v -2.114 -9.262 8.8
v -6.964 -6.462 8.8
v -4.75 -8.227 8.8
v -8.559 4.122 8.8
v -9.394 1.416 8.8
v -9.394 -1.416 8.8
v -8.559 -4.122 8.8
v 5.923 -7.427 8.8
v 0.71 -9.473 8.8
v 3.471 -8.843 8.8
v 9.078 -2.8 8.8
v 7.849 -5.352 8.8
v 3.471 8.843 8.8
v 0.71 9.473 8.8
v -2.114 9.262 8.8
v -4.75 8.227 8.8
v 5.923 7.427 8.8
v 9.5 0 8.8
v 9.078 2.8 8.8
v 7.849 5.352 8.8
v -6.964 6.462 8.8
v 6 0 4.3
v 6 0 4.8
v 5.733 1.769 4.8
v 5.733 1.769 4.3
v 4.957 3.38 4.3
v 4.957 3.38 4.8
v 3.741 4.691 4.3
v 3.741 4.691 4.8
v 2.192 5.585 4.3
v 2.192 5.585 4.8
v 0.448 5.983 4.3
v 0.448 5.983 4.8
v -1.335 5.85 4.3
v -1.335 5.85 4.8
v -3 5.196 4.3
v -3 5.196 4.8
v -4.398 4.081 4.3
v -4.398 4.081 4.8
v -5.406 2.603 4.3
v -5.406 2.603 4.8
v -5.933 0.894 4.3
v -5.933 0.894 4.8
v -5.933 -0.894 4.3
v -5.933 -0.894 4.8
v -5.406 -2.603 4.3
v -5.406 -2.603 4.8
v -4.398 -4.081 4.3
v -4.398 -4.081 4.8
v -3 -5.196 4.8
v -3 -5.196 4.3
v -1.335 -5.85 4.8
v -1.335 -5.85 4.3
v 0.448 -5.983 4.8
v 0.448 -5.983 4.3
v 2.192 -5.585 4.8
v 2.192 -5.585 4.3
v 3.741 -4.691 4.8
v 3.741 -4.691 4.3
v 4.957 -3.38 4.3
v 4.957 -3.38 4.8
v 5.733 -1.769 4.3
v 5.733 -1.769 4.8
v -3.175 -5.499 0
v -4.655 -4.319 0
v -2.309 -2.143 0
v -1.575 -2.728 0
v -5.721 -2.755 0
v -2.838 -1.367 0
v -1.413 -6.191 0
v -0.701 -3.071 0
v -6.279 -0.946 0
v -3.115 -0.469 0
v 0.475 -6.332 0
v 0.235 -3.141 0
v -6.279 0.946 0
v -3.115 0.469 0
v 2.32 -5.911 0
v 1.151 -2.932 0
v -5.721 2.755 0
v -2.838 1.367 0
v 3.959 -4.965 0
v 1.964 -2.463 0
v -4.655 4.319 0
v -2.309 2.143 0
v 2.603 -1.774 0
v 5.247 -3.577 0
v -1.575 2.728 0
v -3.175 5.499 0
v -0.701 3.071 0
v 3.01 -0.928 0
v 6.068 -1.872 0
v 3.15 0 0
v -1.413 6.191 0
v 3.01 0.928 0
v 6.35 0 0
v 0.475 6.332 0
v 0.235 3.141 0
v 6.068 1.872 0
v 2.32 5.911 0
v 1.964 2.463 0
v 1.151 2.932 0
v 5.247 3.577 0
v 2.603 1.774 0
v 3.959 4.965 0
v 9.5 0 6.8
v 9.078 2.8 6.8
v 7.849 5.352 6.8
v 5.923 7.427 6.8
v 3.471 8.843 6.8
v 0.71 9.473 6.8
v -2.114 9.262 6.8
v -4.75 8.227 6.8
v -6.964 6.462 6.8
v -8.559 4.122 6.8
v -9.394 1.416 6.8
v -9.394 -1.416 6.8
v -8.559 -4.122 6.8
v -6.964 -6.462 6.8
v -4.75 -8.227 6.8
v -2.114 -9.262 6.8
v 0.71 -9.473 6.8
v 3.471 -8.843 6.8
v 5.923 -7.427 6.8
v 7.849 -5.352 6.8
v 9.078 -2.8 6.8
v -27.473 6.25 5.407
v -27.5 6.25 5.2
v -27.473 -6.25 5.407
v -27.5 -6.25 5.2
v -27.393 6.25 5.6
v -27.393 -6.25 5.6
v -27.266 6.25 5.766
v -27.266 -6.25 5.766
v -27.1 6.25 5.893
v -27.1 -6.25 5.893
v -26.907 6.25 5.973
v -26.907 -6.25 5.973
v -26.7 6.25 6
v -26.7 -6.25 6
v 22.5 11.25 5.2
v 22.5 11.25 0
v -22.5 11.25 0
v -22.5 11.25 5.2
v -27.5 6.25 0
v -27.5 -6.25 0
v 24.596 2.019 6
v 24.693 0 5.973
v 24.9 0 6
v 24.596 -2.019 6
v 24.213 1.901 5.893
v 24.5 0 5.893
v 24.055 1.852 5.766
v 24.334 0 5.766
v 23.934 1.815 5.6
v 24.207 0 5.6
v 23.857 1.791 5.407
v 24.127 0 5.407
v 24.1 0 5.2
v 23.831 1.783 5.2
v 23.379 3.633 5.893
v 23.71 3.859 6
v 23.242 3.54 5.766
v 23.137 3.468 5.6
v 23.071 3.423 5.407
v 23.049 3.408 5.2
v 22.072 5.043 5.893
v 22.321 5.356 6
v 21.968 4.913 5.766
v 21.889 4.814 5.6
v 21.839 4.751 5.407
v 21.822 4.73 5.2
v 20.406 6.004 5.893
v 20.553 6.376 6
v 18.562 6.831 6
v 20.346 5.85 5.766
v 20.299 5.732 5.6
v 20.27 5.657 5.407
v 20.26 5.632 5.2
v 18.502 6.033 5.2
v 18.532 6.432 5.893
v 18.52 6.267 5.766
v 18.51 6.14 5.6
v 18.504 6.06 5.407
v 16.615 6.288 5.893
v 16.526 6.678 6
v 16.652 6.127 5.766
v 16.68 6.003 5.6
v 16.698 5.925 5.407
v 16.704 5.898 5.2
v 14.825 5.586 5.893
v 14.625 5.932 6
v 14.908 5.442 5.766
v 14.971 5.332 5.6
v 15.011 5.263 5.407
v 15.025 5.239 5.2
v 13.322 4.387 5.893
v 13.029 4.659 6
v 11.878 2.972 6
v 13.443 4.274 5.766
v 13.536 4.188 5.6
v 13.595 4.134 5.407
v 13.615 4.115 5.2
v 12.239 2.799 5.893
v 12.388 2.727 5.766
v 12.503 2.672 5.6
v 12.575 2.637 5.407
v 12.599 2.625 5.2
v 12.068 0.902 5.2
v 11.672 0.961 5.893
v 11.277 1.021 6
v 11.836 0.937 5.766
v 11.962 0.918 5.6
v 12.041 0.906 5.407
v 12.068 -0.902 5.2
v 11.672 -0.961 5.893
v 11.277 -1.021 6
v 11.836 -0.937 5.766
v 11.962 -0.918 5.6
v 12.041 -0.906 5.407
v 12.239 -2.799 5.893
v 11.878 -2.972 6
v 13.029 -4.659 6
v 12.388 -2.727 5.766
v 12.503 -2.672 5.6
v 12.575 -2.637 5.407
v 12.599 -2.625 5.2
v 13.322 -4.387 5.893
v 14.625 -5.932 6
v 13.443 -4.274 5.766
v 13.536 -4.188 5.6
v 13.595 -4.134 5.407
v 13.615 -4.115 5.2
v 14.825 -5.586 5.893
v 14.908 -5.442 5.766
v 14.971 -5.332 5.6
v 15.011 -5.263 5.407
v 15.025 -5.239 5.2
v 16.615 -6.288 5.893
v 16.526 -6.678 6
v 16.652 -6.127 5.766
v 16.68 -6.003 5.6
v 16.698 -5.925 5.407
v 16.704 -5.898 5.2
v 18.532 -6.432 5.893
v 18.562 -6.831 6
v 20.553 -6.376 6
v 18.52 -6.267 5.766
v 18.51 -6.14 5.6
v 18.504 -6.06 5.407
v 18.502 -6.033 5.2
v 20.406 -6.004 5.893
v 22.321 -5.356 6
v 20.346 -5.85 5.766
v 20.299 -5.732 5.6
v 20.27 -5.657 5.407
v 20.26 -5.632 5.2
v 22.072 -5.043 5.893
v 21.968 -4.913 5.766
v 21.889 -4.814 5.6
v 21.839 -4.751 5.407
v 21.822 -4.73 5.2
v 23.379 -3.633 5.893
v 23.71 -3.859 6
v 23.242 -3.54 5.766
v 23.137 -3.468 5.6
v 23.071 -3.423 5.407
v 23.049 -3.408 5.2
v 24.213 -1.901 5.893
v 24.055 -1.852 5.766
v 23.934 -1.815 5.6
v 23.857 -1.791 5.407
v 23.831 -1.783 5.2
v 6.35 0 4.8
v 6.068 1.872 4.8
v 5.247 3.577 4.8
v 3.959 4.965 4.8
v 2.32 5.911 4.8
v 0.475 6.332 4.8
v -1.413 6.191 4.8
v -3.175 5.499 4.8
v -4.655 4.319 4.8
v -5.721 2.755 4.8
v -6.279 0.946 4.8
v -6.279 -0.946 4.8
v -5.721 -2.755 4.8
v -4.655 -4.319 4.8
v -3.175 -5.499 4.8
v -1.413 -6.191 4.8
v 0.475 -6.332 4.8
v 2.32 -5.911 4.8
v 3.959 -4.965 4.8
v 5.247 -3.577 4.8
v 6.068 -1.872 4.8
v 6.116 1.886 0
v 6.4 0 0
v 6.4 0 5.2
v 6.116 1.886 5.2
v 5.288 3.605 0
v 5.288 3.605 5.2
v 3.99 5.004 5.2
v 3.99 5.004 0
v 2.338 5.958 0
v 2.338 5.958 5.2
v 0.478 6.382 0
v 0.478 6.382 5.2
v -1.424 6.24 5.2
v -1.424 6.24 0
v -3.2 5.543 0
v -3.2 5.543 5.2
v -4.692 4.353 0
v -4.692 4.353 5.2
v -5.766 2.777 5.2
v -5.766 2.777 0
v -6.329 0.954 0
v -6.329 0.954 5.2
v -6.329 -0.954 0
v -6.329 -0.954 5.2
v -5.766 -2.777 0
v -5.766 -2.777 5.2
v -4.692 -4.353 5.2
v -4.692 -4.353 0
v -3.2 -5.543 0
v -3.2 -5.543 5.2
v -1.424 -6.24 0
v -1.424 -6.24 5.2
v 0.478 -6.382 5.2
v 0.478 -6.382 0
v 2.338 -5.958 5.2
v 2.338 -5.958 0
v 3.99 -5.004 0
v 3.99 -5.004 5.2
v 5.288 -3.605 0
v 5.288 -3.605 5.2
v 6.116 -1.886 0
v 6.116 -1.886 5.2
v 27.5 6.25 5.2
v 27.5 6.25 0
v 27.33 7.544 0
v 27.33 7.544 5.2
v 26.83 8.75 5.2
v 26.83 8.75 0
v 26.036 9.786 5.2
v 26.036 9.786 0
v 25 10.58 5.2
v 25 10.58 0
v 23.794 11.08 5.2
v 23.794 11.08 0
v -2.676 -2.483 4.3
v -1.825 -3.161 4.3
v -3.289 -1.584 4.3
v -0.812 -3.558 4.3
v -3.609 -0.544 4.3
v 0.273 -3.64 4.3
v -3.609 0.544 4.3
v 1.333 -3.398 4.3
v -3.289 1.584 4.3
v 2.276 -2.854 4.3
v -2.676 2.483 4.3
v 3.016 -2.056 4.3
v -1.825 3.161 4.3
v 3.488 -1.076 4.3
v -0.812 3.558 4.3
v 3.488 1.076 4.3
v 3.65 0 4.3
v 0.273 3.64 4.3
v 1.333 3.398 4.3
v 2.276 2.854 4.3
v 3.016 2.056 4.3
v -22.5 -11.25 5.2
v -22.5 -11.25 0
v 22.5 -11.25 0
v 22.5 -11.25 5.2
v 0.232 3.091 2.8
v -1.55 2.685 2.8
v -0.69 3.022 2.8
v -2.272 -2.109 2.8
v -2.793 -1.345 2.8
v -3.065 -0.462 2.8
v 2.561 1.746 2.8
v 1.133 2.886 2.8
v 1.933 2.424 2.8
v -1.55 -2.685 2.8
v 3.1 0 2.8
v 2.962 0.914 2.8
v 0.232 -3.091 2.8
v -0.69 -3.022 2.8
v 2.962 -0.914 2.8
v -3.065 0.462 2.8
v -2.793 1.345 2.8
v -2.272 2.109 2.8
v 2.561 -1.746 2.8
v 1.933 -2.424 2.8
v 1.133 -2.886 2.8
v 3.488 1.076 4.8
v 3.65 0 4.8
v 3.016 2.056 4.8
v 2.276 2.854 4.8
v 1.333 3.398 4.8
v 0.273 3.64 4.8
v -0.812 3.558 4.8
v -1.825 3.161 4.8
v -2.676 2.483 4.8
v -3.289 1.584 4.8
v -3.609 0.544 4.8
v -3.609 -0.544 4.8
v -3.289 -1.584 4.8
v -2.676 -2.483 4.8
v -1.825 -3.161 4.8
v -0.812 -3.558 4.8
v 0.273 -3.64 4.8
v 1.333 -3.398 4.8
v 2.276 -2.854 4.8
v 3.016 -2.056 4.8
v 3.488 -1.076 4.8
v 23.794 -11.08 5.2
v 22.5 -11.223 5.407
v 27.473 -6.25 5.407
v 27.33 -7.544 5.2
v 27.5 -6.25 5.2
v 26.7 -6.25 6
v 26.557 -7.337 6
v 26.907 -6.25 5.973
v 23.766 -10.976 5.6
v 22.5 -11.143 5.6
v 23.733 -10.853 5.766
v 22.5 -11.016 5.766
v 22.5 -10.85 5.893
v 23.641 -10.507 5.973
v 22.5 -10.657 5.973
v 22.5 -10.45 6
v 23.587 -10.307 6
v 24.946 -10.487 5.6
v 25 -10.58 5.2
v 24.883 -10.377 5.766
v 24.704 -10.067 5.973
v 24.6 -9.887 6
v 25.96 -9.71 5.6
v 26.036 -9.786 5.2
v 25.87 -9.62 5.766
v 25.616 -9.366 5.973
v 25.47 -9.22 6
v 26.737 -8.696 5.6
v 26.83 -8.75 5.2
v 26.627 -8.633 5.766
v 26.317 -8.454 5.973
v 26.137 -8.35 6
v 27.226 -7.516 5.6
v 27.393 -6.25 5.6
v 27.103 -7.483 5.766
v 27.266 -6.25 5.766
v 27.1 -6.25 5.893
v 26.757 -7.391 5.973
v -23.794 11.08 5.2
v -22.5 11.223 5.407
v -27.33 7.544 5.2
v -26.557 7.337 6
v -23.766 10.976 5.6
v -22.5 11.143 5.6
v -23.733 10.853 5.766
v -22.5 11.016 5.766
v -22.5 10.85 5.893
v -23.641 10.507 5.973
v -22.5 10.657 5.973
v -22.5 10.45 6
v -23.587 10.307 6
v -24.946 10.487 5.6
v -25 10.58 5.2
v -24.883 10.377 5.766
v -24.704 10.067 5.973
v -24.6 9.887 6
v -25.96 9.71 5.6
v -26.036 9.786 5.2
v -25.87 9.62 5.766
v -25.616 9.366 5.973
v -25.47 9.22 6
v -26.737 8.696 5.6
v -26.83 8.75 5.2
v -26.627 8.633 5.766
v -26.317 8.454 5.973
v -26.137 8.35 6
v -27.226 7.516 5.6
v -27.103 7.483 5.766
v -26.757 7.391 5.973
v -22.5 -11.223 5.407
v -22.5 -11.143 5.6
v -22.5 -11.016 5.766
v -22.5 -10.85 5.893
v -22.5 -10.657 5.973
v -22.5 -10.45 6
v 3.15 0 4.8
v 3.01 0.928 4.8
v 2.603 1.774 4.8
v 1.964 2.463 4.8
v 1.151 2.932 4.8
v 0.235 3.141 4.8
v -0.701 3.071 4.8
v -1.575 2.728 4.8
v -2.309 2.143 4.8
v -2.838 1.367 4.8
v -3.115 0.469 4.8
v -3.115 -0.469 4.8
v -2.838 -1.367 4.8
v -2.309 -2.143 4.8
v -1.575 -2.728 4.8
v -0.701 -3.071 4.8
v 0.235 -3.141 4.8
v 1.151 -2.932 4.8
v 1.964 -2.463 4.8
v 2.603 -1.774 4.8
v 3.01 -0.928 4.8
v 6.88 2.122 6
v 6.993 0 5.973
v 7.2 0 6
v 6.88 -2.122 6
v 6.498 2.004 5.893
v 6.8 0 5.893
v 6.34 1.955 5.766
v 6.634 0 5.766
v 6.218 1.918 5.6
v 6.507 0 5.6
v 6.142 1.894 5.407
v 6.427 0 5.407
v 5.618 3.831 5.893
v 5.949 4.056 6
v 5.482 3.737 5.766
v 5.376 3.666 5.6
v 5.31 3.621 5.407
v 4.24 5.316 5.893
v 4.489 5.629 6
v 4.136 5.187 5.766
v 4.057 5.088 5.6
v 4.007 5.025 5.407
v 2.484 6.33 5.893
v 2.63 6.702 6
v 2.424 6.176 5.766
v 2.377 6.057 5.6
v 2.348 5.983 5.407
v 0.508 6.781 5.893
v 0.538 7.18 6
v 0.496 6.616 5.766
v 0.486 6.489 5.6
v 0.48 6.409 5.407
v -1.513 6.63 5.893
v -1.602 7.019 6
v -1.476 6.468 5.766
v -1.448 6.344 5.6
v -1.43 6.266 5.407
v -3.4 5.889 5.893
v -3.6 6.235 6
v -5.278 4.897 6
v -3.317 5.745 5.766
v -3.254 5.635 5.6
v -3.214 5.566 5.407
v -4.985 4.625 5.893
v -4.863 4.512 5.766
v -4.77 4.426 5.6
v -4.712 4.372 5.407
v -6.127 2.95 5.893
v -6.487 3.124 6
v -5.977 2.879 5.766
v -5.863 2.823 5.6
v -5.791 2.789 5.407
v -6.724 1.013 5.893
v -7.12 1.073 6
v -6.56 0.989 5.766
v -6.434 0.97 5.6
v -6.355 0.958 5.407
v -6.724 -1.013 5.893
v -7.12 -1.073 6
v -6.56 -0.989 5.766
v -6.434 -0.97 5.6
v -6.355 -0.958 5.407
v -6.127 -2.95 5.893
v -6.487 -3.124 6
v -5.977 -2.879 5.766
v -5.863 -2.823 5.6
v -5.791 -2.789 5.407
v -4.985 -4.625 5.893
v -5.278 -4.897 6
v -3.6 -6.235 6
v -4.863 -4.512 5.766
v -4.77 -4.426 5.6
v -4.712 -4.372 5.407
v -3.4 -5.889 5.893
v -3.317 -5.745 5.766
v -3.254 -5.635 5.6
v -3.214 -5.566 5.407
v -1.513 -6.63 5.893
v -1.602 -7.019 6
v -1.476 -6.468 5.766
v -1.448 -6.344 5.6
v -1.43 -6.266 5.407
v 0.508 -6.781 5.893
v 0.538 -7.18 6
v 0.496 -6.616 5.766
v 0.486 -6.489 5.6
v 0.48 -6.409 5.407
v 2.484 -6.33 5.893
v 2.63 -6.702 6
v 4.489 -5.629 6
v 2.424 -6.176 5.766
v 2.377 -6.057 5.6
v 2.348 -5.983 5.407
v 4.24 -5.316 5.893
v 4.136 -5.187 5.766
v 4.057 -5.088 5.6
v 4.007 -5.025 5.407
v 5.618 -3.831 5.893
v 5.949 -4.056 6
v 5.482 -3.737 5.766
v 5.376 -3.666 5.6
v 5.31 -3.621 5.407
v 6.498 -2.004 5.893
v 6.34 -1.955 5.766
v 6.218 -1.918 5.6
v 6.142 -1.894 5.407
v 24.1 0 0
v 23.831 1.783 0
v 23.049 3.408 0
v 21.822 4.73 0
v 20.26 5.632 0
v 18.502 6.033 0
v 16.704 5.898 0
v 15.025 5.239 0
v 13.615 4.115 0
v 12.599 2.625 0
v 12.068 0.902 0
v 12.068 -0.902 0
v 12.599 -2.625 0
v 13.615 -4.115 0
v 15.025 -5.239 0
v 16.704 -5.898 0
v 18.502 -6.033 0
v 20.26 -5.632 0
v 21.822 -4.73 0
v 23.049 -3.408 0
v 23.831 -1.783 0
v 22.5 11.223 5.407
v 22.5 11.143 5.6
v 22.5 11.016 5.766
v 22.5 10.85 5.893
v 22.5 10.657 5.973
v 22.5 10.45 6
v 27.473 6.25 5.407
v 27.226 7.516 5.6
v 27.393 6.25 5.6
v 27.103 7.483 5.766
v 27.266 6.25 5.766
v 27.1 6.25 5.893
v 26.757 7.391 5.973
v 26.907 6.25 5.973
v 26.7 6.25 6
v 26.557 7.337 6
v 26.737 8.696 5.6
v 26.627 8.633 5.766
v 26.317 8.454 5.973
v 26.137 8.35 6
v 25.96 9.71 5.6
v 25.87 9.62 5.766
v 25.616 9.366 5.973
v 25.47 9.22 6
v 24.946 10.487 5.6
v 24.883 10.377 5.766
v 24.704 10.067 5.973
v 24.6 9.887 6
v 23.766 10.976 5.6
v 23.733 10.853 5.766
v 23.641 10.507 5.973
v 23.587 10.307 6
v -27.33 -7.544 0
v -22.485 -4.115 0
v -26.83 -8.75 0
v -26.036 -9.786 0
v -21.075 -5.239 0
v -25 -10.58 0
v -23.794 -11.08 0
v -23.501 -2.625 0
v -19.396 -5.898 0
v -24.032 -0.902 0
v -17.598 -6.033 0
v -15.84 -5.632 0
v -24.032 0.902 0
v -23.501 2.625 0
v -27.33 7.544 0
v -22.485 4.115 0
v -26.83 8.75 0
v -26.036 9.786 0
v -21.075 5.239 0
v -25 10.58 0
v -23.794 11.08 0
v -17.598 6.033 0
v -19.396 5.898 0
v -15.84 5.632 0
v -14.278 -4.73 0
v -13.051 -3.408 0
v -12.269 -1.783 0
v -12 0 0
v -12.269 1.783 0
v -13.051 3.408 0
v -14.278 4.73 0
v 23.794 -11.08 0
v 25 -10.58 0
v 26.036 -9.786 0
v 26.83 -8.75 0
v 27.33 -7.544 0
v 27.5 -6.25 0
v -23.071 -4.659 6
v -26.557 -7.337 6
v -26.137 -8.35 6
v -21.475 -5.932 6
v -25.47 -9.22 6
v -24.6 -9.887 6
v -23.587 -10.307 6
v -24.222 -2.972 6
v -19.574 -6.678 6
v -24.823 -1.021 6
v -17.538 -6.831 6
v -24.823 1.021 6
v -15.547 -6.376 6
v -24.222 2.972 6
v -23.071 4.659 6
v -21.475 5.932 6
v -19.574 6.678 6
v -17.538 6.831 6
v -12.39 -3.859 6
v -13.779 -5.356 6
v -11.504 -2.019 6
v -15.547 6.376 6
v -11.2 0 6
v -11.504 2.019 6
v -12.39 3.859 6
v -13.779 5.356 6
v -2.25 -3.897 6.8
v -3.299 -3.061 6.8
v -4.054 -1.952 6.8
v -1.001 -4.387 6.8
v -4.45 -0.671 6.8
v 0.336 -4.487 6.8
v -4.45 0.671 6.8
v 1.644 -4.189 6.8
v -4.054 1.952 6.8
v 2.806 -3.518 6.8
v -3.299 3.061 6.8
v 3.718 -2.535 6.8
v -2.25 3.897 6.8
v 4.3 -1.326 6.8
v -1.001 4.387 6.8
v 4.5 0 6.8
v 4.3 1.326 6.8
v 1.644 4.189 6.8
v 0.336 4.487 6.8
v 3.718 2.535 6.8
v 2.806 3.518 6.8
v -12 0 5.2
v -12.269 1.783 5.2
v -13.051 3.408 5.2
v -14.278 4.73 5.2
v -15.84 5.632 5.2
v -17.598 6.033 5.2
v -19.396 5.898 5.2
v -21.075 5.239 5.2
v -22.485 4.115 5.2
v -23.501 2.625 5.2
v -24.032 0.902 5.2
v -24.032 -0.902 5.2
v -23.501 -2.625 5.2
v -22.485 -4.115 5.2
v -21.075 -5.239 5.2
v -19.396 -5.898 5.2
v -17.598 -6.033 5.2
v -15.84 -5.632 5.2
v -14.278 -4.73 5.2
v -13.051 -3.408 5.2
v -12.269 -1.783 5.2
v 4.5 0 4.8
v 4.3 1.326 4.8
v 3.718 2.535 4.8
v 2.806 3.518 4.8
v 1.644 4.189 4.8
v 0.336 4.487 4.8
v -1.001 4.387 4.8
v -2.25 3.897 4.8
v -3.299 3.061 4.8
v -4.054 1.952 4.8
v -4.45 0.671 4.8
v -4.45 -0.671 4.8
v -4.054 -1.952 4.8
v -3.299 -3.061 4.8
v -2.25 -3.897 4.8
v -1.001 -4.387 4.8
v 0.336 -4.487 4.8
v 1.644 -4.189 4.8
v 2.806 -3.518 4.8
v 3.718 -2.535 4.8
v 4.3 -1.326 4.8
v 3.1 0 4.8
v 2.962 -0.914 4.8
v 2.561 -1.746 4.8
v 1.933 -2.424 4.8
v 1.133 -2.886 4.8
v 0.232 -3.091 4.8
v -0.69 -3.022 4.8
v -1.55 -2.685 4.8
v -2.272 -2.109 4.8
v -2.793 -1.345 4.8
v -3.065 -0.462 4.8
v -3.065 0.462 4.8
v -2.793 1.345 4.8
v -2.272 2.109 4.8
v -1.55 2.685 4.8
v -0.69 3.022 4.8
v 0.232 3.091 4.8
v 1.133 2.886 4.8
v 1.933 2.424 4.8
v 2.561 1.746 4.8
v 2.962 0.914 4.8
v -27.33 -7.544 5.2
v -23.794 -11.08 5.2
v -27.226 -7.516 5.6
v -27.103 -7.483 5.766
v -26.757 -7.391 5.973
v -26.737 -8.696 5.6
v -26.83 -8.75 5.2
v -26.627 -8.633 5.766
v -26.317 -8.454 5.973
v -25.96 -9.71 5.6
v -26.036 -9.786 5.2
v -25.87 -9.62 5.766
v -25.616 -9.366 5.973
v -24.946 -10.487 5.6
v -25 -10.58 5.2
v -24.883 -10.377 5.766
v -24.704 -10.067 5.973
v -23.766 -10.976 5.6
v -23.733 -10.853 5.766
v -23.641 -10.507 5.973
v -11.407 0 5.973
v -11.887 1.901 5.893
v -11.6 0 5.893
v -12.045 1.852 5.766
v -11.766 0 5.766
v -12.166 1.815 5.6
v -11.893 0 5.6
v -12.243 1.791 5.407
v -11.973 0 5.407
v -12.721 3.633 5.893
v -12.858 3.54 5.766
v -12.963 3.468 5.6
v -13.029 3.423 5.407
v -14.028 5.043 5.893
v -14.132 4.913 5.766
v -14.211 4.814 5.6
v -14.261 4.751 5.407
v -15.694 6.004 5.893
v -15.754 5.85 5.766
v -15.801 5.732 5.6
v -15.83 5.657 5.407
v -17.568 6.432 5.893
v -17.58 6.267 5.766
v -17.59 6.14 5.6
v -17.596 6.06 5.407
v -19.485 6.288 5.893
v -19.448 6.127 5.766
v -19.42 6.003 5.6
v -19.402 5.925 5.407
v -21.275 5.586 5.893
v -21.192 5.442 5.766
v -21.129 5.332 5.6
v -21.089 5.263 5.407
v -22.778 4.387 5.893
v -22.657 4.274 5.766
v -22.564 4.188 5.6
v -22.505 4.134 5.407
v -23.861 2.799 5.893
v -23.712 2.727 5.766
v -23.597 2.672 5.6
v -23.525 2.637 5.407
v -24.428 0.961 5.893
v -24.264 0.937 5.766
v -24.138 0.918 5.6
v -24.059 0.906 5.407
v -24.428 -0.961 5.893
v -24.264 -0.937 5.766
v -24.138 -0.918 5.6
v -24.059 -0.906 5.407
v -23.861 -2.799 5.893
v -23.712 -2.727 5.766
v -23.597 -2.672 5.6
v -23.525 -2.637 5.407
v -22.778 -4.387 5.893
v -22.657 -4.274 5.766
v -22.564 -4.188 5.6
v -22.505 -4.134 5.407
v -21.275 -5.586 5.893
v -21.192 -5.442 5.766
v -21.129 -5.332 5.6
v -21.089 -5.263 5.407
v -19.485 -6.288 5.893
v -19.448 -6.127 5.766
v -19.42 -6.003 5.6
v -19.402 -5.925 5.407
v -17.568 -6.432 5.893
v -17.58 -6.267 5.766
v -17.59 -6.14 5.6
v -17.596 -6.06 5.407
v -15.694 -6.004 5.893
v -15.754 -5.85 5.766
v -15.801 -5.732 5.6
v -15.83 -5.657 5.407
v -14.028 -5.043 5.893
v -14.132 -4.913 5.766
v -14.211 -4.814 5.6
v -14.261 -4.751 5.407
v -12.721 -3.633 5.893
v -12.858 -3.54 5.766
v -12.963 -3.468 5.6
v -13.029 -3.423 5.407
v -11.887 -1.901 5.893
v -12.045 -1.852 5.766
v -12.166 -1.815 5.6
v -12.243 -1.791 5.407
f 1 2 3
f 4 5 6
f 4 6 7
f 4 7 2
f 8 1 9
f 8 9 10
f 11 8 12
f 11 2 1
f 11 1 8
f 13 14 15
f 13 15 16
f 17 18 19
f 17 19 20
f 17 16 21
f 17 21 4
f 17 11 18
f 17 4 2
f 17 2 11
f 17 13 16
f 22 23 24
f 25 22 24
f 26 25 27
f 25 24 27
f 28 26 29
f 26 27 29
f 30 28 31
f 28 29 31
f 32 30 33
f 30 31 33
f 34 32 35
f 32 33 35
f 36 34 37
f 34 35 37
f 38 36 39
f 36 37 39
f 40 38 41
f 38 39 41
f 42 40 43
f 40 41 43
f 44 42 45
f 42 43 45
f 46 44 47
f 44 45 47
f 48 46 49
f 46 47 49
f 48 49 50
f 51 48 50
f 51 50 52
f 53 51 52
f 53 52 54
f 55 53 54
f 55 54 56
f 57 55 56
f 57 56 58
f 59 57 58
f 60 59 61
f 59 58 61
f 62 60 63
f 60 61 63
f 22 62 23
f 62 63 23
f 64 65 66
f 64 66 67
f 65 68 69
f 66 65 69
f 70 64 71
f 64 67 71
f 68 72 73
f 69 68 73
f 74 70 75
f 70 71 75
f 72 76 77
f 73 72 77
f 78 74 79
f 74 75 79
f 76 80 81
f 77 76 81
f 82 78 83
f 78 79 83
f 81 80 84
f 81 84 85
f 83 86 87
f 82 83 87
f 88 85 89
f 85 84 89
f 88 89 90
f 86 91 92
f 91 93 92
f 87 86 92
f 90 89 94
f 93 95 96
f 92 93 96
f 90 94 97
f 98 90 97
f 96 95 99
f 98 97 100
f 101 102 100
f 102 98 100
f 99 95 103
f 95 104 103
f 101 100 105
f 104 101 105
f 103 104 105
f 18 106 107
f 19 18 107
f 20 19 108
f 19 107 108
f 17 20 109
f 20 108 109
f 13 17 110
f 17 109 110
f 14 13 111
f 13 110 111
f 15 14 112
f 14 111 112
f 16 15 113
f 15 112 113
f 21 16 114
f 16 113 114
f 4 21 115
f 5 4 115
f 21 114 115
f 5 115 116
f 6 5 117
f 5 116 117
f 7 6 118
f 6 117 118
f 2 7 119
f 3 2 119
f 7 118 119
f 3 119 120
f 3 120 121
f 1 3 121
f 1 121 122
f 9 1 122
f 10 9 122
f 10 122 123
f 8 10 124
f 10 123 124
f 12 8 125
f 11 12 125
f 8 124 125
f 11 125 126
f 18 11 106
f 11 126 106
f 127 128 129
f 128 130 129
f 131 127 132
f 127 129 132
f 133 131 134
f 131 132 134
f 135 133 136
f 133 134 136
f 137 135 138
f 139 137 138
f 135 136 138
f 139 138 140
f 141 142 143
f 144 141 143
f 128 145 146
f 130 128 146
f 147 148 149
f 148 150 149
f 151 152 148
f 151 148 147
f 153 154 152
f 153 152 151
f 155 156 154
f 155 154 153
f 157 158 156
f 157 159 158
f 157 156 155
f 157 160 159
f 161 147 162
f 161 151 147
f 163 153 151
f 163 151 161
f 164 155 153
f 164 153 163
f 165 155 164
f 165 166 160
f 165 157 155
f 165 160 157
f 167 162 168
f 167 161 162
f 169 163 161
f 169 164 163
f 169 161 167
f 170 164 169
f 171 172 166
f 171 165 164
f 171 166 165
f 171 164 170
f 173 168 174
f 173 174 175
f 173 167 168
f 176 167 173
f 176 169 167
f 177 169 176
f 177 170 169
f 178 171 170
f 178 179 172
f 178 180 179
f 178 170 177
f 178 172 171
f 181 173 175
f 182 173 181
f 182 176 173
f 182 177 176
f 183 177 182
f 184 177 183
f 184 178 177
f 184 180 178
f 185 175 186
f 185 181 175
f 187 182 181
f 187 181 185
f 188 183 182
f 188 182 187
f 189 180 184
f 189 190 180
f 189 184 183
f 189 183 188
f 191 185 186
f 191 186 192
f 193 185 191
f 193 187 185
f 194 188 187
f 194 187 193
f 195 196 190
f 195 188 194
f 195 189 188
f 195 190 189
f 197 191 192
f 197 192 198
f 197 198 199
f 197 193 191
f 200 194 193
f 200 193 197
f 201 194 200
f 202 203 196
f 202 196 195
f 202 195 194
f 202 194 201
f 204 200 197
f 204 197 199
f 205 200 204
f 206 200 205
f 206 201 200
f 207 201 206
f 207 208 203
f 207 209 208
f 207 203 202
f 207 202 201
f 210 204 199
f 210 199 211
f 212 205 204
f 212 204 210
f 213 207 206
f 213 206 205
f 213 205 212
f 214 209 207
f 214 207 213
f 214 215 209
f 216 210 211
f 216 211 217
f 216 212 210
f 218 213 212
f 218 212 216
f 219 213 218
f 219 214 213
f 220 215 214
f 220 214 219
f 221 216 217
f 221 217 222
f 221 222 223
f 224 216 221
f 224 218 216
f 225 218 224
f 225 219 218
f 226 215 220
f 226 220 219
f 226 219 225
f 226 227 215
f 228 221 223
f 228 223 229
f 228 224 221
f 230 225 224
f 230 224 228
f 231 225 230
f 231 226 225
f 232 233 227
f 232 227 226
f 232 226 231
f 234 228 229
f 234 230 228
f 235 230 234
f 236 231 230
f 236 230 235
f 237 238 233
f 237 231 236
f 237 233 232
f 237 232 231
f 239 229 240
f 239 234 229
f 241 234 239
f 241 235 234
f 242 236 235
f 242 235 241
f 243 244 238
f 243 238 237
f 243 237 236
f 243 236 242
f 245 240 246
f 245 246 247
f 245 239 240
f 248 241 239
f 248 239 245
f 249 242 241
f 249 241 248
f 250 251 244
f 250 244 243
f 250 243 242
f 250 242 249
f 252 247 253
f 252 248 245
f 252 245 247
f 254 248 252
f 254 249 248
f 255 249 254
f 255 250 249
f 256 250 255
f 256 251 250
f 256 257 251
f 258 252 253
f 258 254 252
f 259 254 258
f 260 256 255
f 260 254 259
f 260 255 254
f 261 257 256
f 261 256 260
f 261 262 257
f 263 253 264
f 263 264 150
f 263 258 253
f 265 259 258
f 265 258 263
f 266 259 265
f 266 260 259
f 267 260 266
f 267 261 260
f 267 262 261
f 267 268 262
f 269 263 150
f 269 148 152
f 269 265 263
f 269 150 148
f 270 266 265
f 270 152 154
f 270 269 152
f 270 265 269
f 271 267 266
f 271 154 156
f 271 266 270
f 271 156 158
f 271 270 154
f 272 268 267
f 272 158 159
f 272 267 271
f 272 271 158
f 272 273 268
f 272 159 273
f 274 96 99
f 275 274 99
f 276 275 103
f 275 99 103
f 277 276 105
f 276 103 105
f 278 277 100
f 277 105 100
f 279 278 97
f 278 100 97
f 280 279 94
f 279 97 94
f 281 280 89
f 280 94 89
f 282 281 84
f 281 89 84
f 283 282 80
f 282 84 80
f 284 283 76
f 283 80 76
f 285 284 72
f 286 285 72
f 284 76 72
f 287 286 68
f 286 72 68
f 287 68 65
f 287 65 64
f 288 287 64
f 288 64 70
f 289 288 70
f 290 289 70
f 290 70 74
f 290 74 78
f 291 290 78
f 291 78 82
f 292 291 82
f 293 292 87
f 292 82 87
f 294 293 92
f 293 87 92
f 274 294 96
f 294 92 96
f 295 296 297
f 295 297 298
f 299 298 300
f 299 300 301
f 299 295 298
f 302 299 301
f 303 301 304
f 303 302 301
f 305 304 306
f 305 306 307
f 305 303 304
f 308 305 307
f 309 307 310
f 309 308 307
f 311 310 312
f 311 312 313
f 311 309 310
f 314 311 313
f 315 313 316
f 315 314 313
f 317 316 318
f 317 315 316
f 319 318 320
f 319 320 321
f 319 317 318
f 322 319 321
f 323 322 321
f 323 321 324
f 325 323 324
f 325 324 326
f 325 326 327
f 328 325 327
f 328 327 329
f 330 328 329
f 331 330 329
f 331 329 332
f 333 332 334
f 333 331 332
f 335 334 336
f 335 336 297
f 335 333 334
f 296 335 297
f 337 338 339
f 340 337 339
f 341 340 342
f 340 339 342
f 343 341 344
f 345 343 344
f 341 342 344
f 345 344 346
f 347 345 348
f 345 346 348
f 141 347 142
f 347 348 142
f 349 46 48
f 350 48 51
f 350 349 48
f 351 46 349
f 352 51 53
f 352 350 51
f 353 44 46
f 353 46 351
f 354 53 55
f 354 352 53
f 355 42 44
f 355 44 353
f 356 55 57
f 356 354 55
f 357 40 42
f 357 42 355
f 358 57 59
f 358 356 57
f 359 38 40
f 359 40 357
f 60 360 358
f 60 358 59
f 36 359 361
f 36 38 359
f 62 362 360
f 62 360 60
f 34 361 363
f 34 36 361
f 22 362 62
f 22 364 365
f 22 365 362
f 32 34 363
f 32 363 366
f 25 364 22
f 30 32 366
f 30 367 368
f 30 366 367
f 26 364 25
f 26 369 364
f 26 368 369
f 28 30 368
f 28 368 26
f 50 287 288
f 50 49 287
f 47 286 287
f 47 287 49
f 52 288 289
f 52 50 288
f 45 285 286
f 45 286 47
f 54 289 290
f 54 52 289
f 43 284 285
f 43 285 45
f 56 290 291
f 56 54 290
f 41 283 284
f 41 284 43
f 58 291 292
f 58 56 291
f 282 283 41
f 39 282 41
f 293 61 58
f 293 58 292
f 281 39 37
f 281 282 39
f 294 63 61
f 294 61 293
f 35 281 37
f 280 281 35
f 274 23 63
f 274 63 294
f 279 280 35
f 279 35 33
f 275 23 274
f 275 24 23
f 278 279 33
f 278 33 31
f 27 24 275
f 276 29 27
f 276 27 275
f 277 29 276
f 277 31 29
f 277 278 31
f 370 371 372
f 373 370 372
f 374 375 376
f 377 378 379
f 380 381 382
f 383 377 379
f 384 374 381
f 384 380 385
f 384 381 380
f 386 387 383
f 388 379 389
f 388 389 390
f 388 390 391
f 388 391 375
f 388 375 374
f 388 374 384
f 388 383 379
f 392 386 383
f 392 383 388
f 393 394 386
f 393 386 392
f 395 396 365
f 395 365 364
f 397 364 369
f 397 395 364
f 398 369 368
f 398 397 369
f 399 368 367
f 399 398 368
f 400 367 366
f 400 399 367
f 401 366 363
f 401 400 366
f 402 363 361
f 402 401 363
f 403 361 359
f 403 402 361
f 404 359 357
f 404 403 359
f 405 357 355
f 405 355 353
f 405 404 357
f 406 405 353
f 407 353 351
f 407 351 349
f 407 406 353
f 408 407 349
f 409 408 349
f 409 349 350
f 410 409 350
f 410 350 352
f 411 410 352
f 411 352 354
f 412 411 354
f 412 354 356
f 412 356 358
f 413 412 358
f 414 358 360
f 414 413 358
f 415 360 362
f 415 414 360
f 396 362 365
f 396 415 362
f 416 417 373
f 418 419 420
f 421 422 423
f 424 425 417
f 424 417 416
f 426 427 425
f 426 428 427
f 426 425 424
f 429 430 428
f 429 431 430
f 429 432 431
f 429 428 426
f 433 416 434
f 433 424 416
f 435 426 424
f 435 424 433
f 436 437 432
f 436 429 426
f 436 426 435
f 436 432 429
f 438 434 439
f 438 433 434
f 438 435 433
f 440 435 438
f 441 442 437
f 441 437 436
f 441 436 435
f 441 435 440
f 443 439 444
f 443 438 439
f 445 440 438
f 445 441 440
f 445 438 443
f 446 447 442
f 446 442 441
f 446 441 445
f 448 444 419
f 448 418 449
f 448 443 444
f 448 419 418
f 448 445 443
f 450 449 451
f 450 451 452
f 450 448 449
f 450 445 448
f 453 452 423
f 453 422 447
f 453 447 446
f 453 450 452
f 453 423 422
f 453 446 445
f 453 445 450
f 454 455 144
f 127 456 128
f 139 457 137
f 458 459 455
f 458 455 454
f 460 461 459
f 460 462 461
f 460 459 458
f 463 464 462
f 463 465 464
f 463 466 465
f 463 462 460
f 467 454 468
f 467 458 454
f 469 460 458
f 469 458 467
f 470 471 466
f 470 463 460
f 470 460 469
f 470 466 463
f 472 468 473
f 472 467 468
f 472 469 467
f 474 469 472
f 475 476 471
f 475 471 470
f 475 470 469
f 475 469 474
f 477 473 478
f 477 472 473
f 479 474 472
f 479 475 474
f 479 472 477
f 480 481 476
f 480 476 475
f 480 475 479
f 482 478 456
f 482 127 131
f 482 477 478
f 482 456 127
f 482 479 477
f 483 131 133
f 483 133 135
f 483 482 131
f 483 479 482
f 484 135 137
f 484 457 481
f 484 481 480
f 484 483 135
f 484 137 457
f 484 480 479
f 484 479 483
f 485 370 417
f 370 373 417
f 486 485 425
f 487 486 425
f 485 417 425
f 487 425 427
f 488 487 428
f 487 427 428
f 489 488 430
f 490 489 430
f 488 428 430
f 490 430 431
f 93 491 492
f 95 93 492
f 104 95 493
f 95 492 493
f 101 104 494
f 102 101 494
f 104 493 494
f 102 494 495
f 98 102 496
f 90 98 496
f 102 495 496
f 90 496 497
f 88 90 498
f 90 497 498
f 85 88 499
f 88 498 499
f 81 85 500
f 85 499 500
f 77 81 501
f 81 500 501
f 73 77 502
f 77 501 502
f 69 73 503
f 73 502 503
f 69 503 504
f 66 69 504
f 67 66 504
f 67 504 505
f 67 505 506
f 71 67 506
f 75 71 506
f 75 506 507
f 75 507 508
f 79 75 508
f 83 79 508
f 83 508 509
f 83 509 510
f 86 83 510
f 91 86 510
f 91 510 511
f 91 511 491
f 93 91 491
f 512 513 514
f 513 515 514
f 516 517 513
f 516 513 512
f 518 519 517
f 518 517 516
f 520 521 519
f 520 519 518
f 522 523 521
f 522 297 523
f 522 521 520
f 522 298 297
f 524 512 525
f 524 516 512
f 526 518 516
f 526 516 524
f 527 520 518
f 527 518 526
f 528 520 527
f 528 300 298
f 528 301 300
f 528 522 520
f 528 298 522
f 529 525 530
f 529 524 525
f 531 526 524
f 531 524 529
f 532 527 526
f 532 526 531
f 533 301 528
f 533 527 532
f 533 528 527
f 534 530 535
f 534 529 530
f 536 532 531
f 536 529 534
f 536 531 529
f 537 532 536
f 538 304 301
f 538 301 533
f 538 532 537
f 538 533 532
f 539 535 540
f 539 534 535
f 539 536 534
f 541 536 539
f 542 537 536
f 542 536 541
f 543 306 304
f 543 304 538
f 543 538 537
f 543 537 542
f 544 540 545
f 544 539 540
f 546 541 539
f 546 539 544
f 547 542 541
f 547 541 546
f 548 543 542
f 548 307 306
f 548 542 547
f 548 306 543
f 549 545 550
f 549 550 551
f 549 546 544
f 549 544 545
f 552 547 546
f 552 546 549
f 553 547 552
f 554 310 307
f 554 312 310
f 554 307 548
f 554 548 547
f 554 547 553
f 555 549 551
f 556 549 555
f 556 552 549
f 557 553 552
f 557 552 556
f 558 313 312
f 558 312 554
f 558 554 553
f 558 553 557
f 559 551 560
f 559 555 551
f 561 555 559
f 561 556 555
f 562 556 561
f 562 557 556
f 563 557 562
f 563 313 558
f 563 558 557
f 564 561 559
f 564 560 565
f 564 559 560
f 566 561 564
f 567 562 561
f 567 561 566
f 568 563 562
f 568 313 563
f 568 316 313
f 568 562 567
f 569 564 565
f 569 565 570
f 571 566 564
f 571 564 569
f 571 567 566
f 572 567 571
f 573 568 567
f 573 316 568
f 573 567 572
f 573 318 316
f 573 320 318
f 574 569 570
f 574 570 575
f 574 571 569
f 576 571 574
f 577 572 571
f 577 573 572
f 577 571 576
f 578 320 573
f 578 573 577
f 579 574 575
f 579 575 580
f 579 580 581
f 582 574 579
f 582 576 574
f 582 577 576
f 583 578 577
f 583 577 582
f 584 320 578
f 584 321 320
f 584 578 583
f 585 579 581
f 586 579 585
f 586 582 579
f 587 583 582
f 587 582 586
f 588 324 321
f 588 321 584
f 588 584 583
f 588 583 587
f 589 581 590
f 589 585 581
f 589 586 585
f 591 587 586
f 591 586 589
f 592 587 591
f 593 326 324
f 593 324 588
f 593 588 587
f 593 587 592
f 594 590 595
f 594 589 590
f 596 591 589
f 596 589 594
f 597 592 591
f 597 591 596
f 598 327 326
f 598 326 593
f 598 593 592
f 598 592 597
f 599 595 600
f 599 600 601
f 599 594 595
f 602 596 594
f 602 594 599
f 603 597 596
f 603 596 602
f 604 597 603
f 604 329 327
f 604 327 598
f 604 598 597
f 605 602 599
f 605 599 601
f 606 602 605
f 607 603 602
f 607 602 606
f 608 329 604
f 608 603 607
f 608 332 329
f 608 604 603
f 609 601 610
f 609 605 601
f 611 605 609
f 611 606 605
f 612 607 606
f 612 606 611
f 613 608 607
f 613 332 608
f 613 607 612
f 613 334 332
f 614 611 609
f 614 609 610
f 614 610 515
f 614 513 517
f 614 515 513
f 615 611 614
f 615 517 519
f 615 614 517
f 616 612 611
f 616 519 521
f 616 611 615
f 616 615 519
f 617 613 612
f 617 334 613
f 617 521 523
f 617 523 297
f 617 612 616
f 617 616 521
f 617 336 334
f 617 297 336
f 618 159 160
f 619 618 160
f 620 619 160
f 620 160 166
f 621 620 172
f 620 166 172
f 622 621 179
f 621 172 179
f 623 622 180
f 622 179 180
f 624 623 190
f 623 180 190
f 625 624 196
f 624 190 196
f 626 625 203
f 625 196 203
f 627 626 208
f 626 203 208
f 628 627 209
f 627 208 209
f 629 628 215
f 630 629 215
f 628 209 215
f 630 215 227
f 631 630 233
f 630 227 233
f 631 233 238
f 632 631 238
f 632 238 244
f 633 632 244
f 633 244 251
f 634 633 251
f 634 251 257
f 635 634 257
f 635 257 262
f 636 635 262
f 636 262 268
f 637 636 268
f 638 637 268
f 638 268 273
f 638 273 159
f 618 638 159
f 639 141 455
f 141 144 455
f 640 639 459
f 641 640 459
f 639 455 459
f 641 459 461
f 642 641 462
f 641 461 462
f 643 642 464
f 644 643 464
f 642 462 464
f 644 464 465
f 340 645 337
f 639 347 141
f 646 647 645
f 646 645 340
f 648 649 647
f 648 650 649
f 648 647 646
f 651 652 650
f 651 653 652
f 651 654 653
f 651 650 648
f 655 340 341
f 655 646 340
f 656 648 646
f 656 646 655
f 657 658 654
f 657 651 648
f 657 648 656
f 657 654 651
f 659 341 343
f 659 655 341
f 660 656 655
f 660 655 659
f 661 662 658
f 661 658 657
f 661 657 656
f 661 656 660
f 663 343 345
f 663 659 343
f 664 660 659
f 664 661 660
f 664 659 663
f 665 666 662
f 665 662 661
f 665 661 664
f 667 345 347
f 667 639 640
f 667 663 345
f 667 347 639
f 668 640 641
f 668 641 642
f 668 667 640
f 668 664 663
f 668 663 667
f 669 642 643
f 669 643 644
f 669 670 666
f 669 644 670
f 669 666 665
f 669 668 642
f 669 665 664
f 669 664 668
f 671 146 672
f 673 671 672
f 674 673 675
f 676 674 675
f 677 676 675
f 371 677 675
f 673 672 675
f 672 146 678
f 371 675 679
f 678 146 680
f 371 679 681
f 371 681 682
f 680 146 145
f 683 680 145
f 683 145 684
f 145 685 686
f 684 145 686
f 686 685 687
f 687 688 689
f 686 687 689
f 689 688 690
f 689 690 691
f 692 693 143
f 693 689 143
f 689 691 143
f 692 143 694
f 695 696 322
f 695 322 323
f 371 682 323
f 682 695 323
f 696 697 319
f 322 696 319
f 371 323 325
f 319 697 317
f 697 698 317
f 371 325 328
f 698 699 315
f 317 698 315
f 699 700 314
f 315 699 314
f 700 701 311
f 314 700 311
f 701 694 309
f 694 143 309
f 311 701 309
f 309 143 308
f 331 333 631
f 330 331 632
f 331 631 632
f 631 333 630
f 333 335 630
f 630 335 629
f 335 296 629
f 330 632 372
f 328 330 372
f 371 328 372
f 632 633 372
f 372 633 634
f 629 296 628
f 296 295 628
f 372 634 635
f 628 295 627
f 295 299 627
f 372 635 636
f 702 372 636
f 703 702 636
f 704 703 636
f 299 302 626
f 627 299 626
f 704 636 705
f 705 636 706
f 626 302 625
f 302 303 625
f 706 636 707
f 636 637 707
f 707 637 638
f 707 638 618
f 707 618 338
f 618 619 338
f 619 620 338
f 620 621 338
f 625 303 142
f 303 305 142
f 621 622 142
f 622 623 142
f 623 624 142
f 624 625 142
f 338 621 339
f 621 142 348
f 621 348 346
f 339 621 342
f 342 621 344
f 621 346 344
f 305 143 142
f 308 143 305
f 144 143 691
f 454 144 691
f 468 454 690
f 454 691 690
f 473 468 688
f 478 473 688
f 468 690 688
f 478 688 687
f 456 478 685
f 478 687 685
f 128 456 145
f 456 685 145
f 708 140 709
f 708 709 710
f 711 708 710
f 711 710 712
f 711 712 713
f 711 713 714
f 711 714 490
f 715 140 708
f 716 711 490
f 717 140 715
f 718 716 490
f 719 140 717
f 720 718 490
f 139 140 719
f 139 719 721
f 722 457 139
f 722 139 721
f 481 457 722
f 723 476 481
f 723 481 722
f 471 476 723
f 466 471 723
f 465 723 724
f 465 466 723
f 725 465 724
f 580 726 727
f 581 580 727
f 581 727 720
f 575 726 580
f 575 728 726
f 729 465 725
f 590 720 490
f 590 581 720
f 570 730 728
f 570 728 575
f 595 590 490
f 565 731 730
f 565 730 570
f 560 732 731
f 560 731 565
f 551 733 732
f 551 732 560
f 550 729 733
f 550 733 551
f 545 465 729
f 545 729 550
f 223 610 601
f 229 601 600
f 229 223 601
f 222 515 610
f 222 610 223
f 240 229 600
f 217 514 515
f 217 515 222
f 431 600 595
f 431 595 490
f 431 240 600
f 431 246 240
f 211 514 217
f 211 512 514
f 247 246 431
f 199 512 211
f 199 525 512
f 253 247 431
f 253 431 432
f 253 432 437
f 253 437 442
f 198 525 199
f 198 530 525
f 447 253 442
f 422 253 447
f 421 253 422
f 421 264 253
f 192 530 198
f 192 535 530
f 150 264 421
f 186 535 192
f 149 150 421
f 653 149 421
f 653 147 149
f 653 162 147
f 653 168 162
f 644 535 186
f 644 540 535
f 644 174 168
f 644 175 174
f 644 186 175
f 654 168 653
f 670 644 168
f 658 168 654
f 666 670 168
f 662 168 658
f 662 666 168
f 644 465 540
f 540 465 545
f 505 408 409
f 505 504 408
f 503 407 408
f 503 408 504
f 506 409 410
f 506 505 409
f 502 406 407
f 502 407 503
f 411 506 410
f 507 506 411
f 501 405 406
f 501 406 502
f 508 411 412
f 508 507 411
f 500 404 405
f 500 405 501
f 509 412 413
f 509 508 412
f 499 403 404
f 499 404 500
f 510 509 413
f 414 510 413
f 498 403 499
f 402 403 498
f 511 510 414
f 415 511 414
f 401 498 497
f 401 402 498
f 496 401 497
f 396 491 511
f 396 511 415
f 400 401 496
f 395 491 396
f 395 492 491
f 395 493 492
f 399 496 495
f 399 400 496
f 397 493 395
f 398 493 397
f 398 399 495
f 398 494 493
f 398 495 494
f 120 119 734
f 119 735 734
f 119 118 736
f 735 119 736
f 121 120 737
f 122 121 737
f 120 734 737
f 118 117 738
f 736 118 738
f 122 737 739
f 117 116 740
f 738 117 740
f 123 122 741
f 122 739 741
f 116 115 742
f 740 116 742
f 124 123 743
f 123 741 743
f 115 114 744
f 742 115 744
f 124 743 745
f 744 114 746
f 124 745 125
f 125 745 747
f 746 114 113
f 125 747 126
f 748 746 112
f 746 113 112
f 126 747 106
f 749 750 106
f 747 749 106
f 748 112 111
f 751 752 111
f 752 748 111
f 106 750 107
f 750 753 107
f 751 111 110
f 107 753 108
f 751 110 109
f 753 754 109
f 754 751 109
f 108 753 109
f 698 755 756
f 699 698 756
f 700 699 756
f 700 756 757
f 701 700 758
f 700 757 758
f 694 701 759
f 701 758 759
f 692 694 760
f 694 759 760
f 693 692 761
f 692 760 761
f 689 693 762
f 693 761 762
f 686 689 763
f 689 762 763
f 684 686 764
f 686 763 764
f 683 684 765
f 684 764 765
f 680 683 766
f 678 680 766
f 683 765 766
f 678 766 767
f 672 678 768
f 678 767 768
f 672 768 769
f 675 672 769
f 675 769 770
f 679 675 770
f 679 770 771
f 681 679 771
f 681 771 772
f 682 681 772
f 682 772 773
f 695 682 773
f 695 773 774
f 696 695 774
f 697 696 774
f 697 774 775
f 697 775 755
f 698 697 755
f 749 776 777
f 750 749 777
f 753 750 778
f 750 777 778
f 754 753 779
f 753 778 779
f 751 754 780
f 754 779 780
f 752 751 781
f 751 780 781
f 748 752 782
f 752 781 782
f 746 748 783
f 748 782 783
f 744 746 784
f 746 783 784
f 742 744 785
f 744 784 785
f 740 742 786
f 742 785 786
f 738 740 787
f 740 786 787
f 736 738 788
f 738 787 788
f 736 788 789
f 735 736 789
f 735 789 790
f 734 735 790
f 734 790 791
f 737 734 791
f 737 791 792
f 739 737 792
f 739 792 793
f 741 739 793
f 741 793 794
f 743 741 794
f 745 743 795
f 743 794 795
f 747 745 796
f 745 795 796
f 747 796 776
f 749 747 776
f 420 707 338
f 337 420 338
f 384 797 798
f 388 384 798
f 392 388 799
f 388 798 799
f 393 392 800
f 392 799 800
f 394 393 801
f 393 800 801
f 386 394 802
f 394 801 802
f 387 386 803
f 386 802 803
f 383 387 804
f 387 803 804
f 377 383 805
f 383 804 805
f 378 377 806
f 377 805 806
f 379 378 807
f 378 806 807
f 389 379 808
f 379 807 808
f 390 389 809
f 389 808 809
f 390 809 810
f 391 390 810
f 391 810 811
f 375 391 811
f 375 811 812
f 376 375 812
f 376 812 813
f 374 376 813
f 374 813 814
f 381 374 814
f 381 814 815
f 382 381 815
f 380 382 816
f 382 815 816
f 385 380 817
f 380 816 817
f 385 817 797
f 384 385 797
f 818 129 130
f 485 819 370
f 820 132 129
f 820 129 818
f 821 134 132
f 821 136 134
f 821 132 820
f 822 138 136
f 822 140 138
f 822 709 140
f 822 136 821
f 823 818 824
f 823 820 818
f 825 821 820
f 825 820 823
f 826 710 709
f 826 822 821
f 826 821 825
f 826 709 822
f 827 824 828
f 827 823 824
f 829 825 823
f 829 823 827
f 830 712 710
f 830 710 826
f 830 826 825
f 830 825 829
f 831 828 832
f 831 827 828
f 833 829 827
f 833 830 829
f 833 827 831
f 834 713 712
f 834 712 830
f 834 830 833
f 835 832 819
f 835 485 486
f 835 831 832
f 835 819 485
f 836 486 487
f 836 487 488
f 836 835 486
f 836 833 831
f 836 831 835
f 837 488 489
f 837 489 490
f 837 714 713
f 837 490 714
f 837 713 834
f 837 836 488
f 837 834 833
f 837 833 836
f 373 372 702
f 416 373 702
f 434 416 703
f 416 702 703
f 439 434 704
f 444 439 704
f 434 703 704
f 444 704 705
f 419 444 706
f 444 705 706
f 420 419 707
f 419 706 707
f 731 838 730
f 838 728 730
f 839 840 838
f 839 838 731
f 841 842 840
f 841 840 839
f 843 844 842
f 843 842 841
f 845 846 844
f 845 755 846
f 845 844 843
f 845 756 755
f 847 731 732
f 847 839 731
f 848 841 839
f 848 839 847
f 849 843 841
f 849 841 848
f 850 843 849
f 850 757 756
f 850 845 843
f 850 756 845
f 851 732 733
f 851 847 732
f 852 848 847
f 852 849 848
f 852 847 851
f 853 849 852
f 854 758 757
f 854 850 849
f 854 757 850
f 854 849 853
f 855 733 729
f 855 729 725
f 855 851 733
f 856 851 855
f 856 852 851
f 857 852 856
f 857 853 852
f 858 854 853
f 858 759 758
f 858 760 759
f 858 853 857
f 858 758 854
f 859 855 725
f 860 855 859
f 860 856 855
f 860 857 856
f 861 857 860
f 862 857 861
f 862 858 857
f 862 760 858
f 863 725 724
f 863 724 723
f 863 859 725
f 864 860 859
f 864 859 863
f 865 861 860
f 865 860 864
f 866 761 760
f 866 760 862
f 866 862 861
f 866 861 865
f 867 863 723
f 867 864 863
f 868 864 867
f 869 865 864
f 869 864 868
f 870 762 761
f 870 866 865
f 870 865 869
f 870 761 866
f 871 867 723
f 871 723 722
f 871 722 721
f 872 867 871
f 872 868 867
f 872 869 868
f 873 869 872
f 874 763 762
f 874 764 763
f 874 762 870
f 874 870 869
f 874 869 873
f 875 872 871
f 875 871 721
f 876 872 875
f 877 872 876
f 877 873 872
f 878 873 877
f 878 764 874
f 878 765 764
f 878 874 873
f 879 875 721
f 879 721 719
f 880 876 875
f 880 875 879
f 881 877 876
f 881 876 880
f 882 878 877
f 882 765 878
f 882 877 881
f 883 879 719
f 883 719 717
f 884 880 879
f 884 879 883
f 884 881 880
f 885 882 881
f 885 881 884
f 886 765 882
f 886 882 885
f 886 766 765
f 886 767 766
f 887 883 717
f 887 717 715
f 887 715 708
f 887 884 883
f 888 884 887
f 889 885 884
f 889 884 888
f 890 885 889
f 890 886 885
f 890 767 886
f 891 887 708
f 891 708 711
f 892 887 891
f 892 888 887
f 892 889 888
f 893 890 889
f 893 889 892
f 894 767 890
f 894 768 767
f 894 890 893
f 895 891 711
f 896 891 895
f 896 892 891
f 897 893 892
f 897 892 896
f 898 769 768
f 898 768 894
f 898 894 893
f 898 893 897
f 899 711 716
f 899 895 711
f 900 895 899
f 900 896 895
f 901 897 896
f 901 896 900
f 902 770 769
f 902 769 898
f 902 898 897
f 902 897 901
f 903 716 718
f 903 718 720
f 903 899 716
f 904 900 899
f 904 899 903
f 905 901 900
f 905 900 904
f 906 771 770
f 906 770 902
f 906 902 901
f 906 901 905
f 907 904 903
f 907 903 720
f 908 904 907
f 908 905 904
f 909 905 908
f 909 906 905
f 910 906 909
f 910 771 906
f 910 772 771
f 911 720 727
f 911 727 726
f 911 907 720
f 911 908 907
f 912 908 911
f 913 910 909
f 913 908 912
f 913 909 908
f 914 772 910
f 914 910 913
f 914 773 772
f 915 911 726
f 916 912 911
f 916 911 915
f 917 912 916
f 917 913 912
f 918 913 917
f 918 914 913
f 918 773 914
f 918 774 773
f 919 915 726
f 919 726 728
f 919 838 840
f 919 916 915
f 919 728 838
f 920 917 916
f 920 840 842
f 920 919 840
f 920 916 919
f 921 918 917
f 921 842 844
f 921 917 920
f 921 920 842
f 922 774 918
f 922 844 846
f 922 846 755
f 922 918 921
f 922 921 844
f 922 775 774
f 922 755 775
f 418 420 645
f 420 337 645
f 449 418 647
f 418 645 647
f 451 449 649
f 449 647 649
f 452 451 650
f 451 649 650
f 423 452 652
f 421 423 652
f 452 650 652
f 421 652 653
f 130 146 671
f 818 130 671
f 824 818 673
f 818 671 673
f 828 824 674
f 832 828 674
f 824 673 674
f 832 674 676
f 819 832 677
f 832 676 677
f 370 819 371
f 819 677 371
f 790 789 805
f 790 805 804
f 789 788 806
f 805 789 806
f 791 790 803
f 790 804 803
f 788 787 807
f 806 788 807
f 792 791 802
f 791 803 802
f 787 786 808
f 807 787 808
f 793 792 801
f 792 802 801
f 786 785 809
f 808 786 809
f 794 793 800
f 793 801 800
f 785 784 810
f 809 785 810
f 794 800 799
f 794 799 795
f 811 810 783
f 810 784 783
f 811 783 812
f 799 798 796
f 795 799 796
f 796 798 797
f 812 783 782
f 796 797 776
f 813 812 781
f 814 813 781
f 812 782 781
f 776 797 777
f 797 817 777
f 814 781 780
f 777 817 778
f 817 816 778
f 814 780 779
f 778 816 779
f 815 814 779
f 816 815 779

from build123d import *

# Parameters (mm, degrees)
F0_R      = 6.35
F1_DEPTH  = 4.8
F2_R      = 3.15
F3_DEPTH  = 4.801
F4_R      = 6.4
F5_DEPTH  = 6
F6_R      = 6
F6_R_2    = 3.65
F7_DEPTH  = 0.5
F8_R      = 6.05
F9_DEPTH  = 6.001
F10_R     = 0.8
F12_R     = 4.5
F13_DEPTH = 2
F14_R     = 9.5
F14_R_2   = 4.5
F15_DEPTH = 2
F16_R     = 3.1
F17_DEPTH = 2


with BuildPart() as f1:
    # F0 (on Top) → F1 (new body)
    with BuildSketch(Plane.XY):
        Circle(F0_R)
    extrude(amount=F1_DEPTH)

    # F2 (on face) → F3 (cut, through all)
    with BuildSketch(Plane.XY.offset(4.8)):
        Circle(F2_R)
    extrude(amount=-F3_DEPTH, mode=Mode.SUBTRACT)

    # F6 (on face) → F7 (cut)
    with BuildSketch(Plane.XY.offset(4.8)):
        Circle(F6_R)
        Circle(F6_R_2, mode=Mode.SUBTRACT)
    extrude(amount=-F7_DEPTH, mode=Mode.SUBTRACT)


with BuildPart() as f5:
    # F4 (on Top) → F5 (new body)
    with BuildSketch(Plane.XY):
        with BuildLine():
            ThreePointArc((27.5, 6.25), (26.0355339059, 9.7855339059), (22.5, 11.25))
            Line((22.5, 11.25), (-22.5, 11.25))
            ThreePointArc((-22.5, 11.25), (-26.0355339059, 9.7855339059), (-27.5, 6.25))
            Line((-27.5, 6.25), (-27.5, -6.25))
            ThreePointArc((-27.5, -6.25), (-26.0355339059, -9.7855339059), (-22.5, -11.25))
            Line((-22.5, -11.25), (22.5, -11.25))
            ThreePointArc((22.5, -11.25), (26.0355339059, -9.7855339059), (27.5, -6.25))
            Line((27.5, -6.25), (27.5, 6.25))
        make_face()
        Circle(F4_R, mode=Mode.SUBTRACT)
    extrude(amount=F5_DEPTH)

    # F8 (on face) → F9 (cut, through all)
    with BuildSketch(Plane.XY.offset(6)):
        with Locations((-18.05, 0)):
            Circle(F8_R)
        with Locations((18.05, 0)):
            Circle(F8_R)
    extrude(amount=-F9_DEPTH, mode=Mode.SUBTRACT)

    # F10
    f10_edges = [f5.edges().sort_by_distance(p)[0] for p in [
        (27.5, 0, 6),
        (26.035534, -9.785534, 6),
        (26.035534, 9.785534, 6),
        (0, -11.25, 6),
        (0, 11.25, 6),
        (-26.035534, -9.785534, 6),
        (-26.035534, 9.785534, 6),
        (-27.5, 0, 6),
        (-24.1, 0, 6),
        (-6.4, 0, 6),
        (12, 0, 6),
    ]]
    fillet(f10_edges, radius=F10_R)


with BuildPart() as f13:
    # F12 (on offset) → F13 (new body)
    with BuildSketch(Plane.XY.offset(4.8)):
        Circle(F12_R)
    extrude(amount=F13_DEPTH)

    # F14 (on face) → F15 (join)
    with BuildSketch(Plane.XY.offset(6.8)):
        Circle(F14_R)
        Circle(F14_R_2, mode=Mode.SUBTRACT)
        Circle(F14_R_2)
    extrude(amount=F15_DEPTH)

    # F16 (on face) → F17 (join)
    with BuildSketch(Plane(origin=(0, 0, 4.8), x_dir=(1, 0, 0), z_dir=(0, 0, -1))):
        Circle(F16_R)
    extrude(amount=F17_DEPTH)


solid = Compound([f1.part, f5.part, f13.part])
